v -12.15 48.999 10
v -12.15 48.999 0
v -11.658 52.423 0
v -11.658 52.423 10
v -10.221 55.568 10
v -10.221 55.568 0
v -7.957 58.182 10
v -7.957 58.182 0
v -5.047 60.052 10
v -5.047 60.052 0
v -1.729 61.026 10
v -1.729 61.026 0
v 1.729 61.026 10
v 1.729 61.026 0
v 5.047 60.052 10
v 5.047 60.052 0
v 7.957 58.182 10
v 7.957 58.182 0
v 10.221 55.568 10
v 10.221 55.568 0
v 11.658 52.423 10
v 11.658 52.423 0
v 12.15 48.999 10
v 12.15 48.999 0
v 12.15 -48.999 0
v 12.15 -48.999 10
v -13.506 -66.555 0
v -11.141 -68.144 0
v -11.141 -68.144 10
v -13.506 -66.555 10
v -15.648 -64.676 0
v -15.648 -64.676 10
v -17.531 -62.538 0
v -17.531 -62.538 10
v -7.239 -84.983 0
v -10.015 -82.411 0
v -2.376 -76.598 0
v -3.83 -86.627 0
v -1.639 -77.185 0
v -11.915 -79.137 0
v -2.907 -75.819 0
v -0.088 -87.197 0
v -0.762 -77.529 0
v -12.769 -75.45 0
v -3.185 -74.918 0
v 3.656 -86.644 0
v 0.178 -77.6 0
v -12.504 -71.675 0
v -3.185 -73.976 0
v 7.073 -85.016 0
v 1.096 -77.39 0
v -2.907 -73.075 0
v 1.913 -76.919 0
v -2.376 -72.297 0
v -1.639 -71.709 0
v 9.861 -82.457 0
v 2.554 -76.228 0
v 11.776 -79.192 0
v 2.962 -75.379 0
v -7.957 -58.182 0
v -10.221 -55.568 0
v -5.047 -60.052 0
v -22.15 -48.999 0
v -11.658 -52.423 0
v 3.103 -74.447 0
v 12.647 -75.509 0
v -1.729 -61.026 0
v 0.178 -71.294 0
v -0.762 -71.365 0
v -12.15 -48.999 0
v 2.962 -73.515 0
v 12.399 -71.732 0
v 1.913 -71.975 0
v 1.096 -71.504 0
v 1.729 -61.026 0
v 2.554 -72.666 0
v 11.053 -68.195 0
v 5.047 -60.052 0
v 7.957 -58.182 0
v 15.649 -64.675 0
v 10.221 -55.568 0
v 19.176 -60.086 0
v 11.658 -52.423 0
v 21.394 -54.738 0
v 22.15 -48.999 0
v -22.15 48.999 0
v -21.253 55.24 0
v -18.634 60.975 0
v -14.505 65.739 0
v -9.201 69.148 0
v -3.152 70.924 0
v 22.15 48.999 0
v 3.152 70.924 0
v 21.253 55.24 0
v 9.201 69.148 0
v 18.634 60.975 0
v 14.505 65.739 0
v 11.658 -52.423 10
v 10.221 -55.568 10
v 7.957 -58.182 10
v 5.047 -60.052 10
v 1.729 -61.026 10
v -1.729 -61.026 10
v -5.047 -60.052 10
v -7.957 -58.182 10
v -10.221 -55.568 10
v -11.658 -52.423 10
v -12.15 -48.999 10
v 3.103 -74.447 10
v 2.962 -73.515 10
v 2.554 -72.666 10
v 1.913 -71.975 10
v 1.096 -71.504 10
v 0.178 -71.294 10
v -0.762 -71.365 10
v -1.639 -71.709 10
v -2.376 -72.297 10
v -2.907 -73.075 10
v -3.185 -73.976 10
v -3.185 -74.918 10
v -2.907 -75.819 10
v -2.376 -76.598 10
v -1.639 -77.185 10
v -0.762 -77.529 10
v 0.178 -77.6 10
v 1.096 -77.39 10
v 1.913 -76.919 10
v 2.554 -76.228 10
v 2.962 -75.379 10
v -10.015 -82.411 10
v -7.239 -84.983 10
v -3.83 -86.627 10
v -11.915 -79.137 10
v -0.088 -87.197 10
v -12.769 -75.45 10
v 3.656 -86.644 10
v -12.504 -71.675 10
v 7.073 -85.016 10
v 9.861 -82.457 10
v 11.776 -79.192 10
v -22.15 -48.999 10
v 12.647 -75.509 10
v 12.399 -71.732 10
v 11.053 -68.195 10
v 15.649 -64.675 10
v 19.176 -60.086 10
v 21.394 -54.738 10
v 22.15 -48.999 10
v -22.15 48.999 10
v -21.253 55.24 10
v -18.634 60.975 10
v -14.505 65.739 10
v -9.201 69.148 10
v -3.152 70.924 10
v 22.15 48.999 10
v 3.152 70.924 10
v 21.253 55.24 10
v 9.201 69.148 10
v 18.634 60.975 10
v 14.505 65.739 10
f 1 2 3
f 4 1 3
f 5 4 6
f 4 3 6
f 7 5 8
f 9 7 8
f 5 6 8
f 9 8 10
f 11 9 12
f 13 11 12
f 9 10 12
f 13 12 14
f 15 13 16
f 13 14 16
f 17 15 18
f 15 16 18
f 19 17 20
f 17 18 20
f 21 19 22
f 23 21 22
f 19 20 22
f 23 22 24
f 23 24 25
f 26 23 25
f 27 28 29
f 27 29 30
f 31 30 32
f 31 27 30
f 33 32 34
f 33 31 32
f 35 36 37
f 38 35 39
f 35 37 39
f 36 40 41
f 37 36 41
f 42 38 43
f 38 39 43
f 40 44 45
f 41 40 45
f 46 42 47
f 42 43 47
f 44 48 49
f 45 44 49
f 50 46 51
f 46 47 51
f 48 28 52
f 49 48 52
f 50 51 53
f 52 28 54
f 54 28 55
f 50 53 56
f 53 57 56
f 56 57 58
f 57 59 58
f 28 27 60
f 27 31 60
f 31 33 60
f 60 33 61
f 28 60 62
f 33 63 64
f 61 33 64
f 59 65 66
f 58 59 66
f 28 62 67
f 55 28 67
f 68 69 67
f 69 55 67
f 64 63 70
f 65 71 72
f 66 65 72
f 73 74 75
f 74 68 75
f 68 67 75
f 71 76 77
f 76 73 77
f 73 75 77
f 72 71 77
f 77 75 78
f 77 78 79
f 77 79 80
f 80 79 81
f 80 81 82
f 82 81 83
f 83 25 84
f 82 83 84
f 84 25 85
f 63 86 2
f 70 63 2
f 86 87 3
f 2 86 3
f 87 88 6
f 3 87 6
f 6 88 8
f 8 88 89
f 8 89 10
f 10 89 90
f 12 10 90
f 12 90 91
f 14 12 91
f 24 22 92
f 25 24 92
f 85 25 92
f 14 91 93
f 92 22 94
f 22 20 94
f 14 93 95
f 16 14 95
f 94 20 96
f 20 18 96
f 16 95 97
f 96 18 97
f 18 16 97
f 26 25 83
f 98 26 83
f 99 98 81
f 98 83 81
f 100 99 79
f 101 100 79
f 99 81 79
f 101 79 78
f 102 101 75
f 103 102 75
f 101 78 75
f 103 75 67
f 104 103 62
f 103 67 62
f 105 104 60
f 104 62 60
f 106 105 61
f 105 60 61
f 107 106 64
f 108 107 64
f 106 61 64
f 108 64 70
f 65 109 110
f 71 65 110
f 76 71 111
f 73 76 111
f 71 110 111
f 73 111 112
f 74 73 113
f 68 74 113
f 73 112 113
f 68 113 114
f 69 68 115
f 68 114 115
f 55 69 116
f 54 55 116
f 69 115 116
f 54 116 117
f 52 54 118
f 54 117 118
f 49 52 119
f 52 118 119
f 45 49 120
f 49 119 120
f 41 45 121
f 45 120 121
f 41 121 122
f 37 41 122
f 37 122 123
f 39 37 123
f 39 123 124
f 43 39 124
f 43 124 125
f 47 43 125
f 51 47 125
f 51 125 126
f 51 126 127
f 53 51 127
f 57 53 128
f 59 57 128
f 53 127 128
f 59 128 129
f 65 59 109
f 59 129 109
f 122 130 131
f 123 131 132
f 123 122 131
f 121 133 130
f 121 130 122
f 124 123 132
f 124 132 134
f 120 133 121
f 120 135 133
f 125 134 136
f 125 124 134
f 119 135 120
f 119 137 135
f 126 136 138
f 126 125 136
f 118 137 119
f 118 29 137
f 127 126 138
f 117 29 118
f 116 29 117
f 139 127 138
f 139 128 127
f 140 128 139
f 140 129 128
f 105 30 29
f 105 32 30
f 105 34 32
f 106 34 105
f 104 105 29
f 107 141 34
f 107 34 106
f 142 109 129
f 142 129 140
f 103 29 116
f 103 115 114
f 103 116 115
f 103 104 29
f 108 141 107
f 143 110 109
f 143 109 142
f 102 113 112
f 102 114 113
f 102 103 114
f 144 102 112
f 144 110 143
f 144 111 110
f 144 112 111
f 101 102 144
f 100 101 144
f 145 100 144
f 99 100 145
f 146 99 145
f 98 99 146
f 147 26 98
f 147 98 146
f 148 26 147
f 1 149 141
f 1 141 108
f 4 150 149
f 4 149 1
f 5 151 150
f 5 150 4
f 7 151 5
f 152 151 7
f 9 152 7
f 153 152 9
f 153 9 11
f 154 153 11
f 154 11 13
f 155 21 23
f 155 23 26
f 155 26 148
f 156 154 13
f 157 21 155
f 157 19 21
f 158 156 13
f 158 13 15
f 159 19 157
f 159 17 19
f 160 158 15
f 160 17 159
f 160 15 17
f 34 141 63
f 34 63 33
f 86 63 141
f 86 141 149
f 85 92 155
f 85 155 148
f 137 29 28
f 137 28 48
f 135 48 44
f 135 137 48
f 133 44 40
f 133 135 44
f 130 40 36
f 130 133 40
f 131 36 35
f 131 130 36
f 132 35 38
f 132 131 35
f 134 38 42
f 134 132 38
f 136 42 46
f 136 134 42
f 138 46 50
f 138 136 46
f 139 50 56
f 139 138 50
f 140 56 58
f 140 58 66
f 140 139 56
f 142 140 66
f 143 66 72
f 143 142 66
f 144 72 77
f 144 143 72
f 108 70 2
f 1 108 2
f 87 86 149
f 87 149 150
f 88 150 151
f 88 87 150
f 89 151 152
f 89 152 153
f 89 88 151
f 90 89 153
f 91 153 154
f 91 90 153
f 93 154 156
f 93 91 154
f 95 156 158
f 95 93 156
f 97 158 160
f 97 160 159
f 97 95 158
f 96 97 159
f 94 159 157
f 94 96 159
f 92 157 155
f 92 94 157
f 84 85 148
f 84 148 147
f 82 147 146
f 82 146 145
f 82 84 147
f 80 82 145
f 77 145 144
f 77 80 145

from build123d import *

# Parameters (mm, degrees)
ESTRUSIONE_SOTTILE1_DEPTH    = 10
TAGLIO_ESTRUSIONE2_DEPTH     = 10
SCHIZZO3_R                   = 12.75
SCHIZZO3_R_2                 = 3.161562041
ESTRUSIONE_ESTRUSIONE1_DEPTH = 10


with BuildPart() as part:
    # Schizzo1 → Estrusione-Sottile1 (new body)
    with BuildSketch(Plane.XY):
        with BuildLine():
            Line((22.150088511, 48.999474912), (22.150088511, -48.999474912))
            ThreePointArc((22.150088511, -48.999474912), (0, -71.149563424), (-22.150088511, -48.999474912))
            Line((-22.150088511, -48.999474912), (-22.150088511, 48.999474912))
            ThreePointArc((-22.150088511, 48.999474912), (0, 71.149563424), (22.150088511, 48.999474912))
        make_face()
        with BuildLine():
            Line((12.150088511, 48.999474912), (12.150088511, -48.999474912))
            ThreePointArc((12.150088511, -48.999474912), (0, -61.149563424), (-12.150088511, -48.999474912))
            Line((-12.150088511, -48.999474912), (-12.150088511, 48.999474912))
            ThreePointArc((-12.150088511, 48.999474912), (0, 61.149563424), (12.150088511, 48.999474912))
        make_face(mode=Mode.SUBTRACT)
    extrude(amount=ESTRUSIONE_SOTTILE1_DEPTH)

    # Schizzo2 → Taglio-Estrusione2 (cut)
    with BuildSketch(Plane.XY.offset(10)):
        Polygon((-22.150088511, -48.999474912), (-17.530912976, -62.538068313), (-24.875817955, -62.538068313), (-24.875817955, -48.999474912), align=None)
    extrude(amount=-TAGLIO_ESTRUSIONE2_DEPTH, mode=Mode.SUBTRACT)

    # Schizzo3 → Estrusione-Estrusione1 (add)
    with BuildSketch(Plane.XY.offset(10)):
        with Locations((-0.05861952, -74.447142179)):
            Circle(SCHIZZO3_R)
        with Locations((-0.05861952, -74.447142179)):
            Circle(SCHIZZO3_R_2, mode=Mode.SUBTRACT)
    extrude(amount=-ESTRUSIONE_ESTRUSIONE1_DEPTH)


solid = part.part
